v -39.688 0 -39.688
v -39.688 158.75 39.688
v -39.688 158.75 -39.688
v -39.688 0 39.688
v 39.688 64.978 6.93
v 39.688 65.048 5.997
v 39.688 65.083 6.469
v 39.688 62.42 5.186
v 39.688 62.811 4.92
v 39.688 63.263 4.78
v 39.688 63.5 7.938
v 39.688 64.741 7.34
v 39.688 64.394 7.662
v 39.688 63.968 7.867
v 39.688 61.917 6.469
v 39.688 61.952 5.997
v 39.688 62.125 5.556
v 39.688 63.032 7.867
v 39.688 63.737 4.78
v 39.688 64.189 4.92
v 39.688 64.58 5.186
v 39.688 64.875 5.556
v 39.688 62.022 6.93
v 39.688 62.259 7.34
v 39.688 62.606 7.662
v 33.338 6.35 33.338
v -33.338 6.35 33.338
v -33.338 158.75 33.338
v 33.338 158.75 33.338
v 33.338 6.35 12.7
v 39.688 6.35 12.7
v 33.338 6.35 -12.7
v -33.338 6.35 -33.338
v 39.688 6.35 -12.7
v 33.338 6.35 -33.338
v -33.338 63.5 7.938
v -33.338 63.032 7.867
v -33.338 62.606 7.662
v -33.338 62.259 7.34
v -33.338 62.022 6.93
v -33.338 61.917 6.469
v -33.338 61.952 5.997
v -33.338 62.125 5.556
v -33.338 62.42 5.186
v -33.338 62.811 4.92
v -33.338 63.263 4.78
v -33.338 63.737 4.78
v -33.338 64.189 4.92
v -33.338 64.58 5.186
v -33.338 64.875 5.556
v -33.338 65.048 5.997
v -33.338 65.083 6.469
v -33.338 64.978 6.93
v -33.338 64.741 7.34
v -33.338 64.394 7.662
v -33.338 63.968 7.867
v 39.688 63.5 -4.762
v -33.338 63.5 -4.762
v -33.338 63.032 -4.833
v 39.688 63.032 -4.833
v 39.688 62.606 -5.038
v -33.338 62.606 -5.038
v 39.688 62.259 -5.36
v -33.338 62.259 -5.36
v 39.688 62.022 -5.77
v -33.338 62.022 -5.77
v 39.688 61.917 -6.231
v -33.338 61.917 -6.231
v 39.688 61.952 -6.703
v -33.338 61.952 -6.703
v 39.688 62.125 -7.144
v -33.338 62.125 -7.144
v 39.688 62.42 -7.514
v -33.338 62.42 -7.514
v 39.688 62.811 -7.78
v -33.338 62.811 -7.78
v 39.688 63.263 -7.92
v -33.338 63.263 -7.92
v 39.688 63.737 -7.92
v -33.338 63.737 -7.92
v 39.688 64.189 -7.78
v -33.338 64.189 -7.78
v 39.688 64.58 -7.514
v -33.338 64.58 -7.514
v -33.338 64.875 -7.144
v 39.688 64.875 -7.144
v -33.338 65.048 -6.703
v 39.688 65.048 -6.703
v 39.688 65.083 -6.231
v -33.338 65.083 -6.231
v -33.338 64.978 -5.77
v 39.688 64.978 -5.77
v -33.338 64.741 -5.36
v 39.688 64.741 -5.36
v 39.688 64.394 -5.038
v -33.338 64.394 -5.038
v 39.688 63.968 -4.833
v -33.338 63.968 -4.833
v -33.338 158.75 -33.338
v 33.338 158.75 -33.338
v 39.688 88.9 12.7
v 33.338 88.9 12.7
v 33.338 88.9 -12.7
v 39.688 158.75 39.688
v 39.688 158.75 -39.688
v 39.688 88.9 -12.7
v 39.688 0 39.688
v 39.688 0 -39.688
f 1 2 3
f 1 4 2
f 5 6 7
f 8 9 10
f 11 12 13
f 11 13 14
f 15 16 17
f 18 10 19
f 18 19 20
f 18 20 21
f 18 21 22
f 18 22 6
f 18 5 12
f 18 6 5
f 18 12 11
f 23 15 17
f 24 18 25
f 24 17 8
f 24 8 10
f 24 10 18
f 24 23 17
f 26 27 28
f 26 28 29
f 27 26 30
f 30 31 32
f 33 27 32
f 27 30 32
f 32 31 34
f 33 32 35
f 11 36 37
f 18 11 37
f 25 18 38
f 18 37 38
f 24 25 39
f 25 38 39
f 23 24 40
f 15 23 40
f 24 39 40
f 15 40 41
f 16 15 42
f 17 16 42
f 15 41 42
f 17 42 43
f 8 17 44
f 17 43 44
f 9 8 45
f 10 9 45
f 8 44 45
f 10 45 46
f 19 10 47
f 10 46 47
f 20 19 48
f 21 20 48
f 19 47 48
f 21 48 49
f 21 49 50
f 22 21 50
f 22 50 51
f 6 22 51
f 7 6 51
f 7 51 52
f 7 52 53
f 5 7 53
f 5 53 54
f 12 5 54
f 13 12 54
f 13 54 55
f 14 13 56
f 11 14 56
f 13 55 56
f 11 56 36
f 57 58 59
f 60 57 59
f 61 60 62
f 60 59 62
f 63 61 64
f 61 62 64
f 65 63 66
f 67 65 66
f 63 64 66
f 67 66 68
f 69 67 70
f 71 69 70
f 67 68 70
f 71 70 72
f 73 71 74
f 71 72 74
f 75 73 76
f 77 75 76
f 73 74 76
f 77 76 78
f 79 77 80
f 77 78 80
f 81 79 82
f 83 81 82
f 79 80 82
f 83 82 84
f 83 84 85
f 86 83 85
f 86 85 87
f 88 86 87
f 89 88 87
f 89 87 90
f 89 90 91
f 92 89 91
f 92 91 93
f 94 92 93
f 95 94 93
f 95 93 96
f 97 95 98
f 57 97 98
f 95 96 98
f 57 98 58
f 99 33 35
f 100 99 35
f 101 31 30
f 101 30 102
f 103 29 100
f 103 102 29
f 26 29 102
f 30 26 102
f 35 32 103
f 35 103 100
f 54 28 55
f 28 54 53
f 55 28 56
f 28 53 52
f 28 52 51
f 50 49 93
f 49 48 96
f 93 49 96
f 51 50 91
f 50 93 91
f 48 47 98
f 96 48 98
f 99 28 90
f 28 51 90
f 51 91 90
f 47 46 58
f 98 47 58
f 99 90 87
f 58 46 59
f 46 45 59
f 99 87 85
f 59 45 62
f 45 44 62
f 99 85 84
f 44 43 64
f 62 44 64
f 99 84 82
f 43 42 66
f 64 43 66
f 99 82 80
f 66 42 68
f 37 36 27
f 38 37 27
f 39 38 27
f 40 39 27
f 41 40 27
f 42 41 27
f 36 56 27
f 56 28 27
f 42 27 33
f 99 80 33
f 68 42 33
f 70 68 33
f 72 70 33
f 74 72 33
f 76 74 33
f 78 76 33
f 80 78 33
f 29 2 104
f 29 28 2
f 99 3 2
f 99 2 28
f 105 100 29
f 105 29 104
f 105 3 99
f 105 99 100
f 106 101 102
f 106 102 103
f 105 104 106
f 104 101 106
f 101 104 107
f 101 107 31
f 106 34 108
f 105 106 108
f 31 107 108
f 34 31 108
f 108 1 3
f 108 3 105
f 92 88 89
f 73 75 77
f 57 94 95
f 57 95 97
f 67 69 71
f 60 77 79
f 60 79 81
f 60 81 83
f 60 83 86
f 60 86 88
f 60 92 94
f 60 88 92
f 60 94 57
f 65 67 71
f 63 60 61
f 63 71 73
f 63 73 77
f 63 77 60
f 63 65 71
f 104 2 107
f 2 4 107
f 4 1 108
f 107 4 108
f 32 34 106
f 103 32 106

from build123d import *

# Parameters (mm, degrees)
SKETCH4_W           = 79.375
SKETCH4_H           = 79.375
BOSS_EXTRUDE3_DEPTH = 6.35
SKETCH5_W           = 79.375
SKETCH5_H           = 79.375
SKETCH5_W_2         = 66.675
SKETCH5_H_2         = 66.675
BOSS_EXTRUDE4_DEPTH = 152.4
SKETCH7_W           = 25.4
SKETCH7_H           = 82.55
CUT_EXTRUDE1_DEPTH  = 6.35
SKETCH8_R           = 1.5875
BOSS_EXTRUDE5_DEPTH = 73.025


with BuildPart() as part:
    # Sketch4 → Boss-Extrude3 (new body)
    with BuildSketch(Plane(origin=(0, 0, 0), x_dir=(1, 0, 0), z_dir=(0, 1, 0))):
        Rectangle(SKETCH4_W, SKETCH4_H)
    extrude(amount=BOSS_EXTRUDE3_DEPTH)

    # Sketch5 → Boss-Extrude4 (add)
    with BuildSketch(Plane(origin=(0, 6.35, 0), x_dir=(1, 0, 0), z_dir=(0, 1, 0))):
        Rectangle(SKETCH5_W, SKETCH5_H)
        Rectangle(SKETCH5_W_2, SKETCH5_H_2, mode=Mode.SUBTRACT)
    extrude(amount=BOSS_EXTRUDE4_DEPTH)

    # Sketch7 → Cut-Extrude1 (cut)
    with BuildSketch(Plane(origin=(39.6875, 0, 0), x_dir=(0, 0, -1), z_dir=(1, 0, 0))):
        with Locations((0, 47.625)):
            Rectangle(SKETCH7_W, SKETCH7_H)
    extrude(amount=-CUT_EXTRUDE1_DEPTH, mode=Mode.SUBTRACT)

    # Sketch8 → Boss-Extrude5 (add)
    with BuildSketch(Plane(origin=(-33.3375, 0, 0), x_dir=(0, 0, -1), z_dir=(1, 0, 0))):
        with Locations(Location((-6.35, 63.5, 0), (0, 0, 180))):
            Circle(SKETCH8_R)
        with Locations(Location((6.35, 63.5, 0), (0, 0, 180))):
            Circle(SKETCH8_R)
    extrude(amount=BOSS_EXTRUDE5_DEPTH)


solid = part.part
